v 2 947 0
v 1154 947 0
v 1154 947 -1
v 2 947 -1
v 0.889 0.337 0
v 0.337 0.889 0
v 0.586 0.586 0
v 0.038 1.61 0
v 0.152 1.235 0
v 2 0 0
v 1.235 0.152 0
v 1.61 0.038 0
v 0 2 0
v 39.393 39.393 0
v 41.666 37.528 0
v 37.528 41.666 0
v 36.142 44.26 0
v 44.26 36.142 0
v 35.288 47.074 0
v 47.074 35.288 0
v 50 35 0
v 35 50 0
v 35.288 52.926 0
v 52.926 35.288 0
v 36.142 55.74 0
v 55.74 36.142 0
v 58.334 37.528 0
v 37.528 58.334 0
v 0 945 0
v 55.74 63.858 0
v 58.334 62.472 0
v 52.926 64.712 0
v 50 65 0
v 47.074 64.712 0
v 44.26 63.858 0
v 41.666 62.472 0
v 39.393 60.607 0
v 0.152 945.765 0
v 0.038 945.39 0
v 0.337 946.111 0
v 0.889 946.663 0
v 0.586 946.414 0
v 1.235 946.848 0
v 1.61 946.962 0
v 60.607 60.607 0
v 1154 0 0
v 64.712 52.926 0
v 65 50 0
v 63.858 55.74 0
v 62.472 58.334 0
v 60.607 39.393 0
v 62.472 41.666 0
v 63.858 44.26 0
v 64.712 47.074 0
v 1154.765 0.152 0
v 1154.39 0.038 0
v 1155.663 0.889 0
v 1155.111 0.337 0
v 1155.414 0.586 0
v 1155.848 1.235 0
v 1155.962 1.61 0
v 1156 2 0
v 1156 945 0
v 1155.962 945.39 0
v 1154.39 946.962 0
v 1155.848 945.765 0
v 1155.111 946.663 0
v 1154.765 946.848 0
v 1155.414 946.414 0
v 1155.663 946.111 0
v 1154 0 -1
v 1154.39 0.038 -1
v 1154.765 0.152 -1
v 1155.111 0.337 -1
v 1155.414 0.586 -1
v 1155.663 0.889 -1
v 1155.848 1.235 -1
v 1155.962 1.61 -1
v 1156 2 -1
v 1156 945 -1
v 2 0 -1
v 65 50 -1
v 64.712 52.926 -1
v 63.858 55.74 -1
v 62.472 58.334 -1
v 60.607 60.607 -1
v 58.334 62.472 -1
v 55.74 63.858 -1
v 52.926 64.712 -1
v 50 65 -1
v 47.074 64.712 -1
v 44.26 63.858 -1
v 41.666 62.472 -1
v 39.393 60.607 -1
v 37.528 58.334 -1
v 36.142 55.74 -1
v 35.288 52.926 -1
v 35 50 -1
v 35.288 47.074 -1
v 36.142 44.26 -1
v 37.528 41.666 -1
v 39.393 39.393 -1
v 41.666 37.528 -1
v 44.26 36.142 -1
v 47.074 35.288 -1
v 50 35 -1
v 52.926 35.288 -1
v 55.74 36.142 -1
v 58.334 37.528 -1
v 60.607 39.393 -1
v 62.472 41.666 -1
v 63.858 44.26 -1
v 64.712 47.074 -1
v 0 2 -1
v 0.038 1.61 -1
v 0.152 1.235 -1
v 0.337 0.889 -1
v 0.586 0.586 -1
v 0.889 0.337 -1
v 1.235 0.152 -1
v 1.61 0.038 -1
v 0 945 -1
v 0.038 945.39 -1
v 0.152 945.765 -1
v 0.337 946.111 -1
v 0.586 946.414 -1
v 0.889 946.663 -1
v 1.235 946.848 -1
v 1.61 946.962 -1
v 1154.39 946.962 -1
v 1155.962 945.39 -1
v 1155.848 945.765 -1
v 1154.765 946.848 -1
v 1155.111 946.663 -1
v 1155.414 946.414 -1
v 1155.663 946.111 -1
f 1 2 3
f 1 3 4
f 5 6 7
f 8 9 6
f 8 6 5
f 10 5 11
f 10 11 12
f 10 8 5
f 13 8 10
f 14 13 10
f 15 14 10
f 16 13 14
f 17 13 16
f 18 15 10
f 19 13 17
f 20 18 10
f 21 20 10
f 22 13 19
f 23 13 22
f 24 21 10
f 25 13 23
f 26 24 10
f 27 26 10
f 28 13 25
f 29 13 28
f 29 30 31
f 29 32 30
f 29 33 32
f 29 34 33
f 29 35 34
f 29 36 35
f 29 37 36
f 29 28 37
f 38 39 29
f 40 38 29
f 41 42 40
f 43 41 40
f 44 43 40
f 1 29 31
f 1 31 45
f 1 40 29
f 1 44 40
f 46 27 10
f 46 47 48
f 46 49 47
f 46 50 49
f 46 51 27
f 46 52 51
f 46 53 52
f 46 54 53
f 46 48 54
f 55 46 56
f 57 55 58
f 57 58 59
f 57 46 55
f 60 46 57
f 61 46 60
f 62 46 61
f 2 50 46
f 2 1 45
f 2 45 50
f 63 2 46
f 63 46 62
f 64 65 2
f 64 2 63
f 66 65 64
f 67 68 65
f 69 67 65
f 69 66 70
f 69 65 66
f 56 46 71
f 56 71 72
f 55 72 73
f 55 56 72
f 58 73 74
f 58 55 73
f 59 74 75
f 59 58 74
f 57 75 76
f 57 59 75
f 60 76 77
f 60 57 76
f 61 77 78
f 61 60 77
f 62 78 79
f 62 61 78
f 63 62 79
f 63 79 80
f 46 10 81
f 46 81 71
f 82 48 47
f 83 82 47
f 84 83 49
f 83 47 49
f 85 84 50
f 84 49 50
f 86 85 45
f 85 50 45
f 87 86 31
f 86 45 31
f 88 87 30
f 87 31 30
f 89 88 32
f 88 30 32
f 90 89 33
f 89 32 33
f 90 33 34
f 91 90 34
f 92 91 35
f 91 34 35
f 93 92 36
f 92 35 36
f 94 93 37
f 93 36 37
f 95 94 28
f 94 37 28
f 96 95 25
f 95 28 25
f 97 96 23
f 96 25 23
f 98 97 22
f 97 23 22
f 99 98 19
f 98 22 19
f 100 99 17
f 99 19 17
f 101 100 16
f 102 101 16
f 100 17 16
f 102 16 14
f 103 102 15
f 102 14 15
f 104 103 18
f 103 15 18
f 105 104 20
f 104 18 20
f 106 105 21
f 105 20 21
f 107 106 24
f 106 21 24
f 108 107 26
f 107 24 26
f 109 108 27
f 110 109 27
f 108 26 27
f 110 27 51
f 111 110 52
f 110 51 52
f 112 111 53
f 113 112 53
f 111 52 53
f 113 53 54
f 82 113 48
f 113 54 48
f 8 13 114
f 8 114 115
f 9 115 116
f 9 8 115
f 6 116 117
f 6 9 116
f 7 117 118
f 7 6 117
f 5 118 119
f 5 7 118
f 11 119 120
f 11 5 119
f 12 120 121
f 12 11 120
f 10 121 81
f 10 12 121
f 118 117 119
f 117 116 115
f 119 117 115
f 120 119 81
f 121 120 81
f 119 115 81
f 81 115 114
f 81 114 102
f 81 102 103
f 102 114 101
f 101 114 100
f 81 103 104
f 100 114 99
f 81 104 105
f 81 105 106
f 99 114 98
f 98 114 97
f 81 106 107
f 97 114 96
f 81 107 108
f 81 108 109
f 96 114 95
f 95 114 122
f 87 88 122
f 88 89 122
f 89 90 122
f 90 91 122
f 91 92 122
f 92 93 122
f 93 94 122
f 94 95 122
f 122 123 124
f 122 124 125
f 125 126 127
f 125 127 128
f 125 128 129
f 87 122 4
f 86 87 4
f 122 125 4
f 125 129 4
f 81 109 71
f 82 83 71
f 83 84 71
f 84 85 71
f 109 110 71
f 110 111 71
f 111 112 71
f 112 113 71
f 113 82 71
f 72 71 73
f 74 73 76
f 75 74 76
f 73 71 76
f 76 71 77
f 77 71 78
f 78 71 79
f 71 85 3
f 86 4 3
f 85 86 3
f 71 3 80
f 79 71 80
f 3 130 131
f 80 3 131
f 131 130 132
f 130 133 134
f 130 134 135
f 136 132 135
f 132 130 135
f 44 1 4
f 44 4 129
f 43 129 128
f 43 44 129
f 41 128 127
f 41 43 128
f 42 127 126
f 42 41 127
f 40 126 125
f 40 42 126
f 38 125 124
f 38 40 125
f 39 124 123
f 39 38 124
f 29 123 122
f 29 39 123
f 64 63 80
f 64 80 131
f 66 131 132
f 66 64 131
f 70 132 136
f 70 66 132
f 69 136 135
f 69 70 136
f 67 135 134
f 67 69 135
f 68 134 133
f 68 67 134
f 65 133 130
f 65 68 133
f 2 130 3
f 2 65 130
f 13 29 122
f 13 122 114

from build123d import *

# Parameters (mm, degrees)
SKETCH1_R          = 15
BASE_FLANGE1_DEPTH = 1


# Sheet-metal steps are written as plain solids
with BuildPart() as part:
    # Sketch1 → Base-Flange1 (new body)
    with BuildSketch(Plane.XY):
        with BuildLine():
            Line((2, 0), (1154, 0))
            ThreePointArc((1154, 0), (1155.414213562, 0.585786438), (1156, 2))
            Line((1156, 2), (1156, 945))
            ThreePointArc((1156, 945), (1155.414213562, 946.414213562), (1154, 947))
            Line((1154, 947), (2, 947))
            ThreePointArc((2, 947), (0.585786438, 946.414213562), (0, 945))
            Line((0, 945), (0, 2))
            ThreePointArc((0, 2), (0.585786438, 0.585786438), (2, 0))
        make_face()
        with Locations((50, 50)):
            Circle(SKETCH1_R, mode=Mode.SUBTRACT)
    extrude(amount=-BASE_FLANGE1_DEPTH)


solid = part.part
